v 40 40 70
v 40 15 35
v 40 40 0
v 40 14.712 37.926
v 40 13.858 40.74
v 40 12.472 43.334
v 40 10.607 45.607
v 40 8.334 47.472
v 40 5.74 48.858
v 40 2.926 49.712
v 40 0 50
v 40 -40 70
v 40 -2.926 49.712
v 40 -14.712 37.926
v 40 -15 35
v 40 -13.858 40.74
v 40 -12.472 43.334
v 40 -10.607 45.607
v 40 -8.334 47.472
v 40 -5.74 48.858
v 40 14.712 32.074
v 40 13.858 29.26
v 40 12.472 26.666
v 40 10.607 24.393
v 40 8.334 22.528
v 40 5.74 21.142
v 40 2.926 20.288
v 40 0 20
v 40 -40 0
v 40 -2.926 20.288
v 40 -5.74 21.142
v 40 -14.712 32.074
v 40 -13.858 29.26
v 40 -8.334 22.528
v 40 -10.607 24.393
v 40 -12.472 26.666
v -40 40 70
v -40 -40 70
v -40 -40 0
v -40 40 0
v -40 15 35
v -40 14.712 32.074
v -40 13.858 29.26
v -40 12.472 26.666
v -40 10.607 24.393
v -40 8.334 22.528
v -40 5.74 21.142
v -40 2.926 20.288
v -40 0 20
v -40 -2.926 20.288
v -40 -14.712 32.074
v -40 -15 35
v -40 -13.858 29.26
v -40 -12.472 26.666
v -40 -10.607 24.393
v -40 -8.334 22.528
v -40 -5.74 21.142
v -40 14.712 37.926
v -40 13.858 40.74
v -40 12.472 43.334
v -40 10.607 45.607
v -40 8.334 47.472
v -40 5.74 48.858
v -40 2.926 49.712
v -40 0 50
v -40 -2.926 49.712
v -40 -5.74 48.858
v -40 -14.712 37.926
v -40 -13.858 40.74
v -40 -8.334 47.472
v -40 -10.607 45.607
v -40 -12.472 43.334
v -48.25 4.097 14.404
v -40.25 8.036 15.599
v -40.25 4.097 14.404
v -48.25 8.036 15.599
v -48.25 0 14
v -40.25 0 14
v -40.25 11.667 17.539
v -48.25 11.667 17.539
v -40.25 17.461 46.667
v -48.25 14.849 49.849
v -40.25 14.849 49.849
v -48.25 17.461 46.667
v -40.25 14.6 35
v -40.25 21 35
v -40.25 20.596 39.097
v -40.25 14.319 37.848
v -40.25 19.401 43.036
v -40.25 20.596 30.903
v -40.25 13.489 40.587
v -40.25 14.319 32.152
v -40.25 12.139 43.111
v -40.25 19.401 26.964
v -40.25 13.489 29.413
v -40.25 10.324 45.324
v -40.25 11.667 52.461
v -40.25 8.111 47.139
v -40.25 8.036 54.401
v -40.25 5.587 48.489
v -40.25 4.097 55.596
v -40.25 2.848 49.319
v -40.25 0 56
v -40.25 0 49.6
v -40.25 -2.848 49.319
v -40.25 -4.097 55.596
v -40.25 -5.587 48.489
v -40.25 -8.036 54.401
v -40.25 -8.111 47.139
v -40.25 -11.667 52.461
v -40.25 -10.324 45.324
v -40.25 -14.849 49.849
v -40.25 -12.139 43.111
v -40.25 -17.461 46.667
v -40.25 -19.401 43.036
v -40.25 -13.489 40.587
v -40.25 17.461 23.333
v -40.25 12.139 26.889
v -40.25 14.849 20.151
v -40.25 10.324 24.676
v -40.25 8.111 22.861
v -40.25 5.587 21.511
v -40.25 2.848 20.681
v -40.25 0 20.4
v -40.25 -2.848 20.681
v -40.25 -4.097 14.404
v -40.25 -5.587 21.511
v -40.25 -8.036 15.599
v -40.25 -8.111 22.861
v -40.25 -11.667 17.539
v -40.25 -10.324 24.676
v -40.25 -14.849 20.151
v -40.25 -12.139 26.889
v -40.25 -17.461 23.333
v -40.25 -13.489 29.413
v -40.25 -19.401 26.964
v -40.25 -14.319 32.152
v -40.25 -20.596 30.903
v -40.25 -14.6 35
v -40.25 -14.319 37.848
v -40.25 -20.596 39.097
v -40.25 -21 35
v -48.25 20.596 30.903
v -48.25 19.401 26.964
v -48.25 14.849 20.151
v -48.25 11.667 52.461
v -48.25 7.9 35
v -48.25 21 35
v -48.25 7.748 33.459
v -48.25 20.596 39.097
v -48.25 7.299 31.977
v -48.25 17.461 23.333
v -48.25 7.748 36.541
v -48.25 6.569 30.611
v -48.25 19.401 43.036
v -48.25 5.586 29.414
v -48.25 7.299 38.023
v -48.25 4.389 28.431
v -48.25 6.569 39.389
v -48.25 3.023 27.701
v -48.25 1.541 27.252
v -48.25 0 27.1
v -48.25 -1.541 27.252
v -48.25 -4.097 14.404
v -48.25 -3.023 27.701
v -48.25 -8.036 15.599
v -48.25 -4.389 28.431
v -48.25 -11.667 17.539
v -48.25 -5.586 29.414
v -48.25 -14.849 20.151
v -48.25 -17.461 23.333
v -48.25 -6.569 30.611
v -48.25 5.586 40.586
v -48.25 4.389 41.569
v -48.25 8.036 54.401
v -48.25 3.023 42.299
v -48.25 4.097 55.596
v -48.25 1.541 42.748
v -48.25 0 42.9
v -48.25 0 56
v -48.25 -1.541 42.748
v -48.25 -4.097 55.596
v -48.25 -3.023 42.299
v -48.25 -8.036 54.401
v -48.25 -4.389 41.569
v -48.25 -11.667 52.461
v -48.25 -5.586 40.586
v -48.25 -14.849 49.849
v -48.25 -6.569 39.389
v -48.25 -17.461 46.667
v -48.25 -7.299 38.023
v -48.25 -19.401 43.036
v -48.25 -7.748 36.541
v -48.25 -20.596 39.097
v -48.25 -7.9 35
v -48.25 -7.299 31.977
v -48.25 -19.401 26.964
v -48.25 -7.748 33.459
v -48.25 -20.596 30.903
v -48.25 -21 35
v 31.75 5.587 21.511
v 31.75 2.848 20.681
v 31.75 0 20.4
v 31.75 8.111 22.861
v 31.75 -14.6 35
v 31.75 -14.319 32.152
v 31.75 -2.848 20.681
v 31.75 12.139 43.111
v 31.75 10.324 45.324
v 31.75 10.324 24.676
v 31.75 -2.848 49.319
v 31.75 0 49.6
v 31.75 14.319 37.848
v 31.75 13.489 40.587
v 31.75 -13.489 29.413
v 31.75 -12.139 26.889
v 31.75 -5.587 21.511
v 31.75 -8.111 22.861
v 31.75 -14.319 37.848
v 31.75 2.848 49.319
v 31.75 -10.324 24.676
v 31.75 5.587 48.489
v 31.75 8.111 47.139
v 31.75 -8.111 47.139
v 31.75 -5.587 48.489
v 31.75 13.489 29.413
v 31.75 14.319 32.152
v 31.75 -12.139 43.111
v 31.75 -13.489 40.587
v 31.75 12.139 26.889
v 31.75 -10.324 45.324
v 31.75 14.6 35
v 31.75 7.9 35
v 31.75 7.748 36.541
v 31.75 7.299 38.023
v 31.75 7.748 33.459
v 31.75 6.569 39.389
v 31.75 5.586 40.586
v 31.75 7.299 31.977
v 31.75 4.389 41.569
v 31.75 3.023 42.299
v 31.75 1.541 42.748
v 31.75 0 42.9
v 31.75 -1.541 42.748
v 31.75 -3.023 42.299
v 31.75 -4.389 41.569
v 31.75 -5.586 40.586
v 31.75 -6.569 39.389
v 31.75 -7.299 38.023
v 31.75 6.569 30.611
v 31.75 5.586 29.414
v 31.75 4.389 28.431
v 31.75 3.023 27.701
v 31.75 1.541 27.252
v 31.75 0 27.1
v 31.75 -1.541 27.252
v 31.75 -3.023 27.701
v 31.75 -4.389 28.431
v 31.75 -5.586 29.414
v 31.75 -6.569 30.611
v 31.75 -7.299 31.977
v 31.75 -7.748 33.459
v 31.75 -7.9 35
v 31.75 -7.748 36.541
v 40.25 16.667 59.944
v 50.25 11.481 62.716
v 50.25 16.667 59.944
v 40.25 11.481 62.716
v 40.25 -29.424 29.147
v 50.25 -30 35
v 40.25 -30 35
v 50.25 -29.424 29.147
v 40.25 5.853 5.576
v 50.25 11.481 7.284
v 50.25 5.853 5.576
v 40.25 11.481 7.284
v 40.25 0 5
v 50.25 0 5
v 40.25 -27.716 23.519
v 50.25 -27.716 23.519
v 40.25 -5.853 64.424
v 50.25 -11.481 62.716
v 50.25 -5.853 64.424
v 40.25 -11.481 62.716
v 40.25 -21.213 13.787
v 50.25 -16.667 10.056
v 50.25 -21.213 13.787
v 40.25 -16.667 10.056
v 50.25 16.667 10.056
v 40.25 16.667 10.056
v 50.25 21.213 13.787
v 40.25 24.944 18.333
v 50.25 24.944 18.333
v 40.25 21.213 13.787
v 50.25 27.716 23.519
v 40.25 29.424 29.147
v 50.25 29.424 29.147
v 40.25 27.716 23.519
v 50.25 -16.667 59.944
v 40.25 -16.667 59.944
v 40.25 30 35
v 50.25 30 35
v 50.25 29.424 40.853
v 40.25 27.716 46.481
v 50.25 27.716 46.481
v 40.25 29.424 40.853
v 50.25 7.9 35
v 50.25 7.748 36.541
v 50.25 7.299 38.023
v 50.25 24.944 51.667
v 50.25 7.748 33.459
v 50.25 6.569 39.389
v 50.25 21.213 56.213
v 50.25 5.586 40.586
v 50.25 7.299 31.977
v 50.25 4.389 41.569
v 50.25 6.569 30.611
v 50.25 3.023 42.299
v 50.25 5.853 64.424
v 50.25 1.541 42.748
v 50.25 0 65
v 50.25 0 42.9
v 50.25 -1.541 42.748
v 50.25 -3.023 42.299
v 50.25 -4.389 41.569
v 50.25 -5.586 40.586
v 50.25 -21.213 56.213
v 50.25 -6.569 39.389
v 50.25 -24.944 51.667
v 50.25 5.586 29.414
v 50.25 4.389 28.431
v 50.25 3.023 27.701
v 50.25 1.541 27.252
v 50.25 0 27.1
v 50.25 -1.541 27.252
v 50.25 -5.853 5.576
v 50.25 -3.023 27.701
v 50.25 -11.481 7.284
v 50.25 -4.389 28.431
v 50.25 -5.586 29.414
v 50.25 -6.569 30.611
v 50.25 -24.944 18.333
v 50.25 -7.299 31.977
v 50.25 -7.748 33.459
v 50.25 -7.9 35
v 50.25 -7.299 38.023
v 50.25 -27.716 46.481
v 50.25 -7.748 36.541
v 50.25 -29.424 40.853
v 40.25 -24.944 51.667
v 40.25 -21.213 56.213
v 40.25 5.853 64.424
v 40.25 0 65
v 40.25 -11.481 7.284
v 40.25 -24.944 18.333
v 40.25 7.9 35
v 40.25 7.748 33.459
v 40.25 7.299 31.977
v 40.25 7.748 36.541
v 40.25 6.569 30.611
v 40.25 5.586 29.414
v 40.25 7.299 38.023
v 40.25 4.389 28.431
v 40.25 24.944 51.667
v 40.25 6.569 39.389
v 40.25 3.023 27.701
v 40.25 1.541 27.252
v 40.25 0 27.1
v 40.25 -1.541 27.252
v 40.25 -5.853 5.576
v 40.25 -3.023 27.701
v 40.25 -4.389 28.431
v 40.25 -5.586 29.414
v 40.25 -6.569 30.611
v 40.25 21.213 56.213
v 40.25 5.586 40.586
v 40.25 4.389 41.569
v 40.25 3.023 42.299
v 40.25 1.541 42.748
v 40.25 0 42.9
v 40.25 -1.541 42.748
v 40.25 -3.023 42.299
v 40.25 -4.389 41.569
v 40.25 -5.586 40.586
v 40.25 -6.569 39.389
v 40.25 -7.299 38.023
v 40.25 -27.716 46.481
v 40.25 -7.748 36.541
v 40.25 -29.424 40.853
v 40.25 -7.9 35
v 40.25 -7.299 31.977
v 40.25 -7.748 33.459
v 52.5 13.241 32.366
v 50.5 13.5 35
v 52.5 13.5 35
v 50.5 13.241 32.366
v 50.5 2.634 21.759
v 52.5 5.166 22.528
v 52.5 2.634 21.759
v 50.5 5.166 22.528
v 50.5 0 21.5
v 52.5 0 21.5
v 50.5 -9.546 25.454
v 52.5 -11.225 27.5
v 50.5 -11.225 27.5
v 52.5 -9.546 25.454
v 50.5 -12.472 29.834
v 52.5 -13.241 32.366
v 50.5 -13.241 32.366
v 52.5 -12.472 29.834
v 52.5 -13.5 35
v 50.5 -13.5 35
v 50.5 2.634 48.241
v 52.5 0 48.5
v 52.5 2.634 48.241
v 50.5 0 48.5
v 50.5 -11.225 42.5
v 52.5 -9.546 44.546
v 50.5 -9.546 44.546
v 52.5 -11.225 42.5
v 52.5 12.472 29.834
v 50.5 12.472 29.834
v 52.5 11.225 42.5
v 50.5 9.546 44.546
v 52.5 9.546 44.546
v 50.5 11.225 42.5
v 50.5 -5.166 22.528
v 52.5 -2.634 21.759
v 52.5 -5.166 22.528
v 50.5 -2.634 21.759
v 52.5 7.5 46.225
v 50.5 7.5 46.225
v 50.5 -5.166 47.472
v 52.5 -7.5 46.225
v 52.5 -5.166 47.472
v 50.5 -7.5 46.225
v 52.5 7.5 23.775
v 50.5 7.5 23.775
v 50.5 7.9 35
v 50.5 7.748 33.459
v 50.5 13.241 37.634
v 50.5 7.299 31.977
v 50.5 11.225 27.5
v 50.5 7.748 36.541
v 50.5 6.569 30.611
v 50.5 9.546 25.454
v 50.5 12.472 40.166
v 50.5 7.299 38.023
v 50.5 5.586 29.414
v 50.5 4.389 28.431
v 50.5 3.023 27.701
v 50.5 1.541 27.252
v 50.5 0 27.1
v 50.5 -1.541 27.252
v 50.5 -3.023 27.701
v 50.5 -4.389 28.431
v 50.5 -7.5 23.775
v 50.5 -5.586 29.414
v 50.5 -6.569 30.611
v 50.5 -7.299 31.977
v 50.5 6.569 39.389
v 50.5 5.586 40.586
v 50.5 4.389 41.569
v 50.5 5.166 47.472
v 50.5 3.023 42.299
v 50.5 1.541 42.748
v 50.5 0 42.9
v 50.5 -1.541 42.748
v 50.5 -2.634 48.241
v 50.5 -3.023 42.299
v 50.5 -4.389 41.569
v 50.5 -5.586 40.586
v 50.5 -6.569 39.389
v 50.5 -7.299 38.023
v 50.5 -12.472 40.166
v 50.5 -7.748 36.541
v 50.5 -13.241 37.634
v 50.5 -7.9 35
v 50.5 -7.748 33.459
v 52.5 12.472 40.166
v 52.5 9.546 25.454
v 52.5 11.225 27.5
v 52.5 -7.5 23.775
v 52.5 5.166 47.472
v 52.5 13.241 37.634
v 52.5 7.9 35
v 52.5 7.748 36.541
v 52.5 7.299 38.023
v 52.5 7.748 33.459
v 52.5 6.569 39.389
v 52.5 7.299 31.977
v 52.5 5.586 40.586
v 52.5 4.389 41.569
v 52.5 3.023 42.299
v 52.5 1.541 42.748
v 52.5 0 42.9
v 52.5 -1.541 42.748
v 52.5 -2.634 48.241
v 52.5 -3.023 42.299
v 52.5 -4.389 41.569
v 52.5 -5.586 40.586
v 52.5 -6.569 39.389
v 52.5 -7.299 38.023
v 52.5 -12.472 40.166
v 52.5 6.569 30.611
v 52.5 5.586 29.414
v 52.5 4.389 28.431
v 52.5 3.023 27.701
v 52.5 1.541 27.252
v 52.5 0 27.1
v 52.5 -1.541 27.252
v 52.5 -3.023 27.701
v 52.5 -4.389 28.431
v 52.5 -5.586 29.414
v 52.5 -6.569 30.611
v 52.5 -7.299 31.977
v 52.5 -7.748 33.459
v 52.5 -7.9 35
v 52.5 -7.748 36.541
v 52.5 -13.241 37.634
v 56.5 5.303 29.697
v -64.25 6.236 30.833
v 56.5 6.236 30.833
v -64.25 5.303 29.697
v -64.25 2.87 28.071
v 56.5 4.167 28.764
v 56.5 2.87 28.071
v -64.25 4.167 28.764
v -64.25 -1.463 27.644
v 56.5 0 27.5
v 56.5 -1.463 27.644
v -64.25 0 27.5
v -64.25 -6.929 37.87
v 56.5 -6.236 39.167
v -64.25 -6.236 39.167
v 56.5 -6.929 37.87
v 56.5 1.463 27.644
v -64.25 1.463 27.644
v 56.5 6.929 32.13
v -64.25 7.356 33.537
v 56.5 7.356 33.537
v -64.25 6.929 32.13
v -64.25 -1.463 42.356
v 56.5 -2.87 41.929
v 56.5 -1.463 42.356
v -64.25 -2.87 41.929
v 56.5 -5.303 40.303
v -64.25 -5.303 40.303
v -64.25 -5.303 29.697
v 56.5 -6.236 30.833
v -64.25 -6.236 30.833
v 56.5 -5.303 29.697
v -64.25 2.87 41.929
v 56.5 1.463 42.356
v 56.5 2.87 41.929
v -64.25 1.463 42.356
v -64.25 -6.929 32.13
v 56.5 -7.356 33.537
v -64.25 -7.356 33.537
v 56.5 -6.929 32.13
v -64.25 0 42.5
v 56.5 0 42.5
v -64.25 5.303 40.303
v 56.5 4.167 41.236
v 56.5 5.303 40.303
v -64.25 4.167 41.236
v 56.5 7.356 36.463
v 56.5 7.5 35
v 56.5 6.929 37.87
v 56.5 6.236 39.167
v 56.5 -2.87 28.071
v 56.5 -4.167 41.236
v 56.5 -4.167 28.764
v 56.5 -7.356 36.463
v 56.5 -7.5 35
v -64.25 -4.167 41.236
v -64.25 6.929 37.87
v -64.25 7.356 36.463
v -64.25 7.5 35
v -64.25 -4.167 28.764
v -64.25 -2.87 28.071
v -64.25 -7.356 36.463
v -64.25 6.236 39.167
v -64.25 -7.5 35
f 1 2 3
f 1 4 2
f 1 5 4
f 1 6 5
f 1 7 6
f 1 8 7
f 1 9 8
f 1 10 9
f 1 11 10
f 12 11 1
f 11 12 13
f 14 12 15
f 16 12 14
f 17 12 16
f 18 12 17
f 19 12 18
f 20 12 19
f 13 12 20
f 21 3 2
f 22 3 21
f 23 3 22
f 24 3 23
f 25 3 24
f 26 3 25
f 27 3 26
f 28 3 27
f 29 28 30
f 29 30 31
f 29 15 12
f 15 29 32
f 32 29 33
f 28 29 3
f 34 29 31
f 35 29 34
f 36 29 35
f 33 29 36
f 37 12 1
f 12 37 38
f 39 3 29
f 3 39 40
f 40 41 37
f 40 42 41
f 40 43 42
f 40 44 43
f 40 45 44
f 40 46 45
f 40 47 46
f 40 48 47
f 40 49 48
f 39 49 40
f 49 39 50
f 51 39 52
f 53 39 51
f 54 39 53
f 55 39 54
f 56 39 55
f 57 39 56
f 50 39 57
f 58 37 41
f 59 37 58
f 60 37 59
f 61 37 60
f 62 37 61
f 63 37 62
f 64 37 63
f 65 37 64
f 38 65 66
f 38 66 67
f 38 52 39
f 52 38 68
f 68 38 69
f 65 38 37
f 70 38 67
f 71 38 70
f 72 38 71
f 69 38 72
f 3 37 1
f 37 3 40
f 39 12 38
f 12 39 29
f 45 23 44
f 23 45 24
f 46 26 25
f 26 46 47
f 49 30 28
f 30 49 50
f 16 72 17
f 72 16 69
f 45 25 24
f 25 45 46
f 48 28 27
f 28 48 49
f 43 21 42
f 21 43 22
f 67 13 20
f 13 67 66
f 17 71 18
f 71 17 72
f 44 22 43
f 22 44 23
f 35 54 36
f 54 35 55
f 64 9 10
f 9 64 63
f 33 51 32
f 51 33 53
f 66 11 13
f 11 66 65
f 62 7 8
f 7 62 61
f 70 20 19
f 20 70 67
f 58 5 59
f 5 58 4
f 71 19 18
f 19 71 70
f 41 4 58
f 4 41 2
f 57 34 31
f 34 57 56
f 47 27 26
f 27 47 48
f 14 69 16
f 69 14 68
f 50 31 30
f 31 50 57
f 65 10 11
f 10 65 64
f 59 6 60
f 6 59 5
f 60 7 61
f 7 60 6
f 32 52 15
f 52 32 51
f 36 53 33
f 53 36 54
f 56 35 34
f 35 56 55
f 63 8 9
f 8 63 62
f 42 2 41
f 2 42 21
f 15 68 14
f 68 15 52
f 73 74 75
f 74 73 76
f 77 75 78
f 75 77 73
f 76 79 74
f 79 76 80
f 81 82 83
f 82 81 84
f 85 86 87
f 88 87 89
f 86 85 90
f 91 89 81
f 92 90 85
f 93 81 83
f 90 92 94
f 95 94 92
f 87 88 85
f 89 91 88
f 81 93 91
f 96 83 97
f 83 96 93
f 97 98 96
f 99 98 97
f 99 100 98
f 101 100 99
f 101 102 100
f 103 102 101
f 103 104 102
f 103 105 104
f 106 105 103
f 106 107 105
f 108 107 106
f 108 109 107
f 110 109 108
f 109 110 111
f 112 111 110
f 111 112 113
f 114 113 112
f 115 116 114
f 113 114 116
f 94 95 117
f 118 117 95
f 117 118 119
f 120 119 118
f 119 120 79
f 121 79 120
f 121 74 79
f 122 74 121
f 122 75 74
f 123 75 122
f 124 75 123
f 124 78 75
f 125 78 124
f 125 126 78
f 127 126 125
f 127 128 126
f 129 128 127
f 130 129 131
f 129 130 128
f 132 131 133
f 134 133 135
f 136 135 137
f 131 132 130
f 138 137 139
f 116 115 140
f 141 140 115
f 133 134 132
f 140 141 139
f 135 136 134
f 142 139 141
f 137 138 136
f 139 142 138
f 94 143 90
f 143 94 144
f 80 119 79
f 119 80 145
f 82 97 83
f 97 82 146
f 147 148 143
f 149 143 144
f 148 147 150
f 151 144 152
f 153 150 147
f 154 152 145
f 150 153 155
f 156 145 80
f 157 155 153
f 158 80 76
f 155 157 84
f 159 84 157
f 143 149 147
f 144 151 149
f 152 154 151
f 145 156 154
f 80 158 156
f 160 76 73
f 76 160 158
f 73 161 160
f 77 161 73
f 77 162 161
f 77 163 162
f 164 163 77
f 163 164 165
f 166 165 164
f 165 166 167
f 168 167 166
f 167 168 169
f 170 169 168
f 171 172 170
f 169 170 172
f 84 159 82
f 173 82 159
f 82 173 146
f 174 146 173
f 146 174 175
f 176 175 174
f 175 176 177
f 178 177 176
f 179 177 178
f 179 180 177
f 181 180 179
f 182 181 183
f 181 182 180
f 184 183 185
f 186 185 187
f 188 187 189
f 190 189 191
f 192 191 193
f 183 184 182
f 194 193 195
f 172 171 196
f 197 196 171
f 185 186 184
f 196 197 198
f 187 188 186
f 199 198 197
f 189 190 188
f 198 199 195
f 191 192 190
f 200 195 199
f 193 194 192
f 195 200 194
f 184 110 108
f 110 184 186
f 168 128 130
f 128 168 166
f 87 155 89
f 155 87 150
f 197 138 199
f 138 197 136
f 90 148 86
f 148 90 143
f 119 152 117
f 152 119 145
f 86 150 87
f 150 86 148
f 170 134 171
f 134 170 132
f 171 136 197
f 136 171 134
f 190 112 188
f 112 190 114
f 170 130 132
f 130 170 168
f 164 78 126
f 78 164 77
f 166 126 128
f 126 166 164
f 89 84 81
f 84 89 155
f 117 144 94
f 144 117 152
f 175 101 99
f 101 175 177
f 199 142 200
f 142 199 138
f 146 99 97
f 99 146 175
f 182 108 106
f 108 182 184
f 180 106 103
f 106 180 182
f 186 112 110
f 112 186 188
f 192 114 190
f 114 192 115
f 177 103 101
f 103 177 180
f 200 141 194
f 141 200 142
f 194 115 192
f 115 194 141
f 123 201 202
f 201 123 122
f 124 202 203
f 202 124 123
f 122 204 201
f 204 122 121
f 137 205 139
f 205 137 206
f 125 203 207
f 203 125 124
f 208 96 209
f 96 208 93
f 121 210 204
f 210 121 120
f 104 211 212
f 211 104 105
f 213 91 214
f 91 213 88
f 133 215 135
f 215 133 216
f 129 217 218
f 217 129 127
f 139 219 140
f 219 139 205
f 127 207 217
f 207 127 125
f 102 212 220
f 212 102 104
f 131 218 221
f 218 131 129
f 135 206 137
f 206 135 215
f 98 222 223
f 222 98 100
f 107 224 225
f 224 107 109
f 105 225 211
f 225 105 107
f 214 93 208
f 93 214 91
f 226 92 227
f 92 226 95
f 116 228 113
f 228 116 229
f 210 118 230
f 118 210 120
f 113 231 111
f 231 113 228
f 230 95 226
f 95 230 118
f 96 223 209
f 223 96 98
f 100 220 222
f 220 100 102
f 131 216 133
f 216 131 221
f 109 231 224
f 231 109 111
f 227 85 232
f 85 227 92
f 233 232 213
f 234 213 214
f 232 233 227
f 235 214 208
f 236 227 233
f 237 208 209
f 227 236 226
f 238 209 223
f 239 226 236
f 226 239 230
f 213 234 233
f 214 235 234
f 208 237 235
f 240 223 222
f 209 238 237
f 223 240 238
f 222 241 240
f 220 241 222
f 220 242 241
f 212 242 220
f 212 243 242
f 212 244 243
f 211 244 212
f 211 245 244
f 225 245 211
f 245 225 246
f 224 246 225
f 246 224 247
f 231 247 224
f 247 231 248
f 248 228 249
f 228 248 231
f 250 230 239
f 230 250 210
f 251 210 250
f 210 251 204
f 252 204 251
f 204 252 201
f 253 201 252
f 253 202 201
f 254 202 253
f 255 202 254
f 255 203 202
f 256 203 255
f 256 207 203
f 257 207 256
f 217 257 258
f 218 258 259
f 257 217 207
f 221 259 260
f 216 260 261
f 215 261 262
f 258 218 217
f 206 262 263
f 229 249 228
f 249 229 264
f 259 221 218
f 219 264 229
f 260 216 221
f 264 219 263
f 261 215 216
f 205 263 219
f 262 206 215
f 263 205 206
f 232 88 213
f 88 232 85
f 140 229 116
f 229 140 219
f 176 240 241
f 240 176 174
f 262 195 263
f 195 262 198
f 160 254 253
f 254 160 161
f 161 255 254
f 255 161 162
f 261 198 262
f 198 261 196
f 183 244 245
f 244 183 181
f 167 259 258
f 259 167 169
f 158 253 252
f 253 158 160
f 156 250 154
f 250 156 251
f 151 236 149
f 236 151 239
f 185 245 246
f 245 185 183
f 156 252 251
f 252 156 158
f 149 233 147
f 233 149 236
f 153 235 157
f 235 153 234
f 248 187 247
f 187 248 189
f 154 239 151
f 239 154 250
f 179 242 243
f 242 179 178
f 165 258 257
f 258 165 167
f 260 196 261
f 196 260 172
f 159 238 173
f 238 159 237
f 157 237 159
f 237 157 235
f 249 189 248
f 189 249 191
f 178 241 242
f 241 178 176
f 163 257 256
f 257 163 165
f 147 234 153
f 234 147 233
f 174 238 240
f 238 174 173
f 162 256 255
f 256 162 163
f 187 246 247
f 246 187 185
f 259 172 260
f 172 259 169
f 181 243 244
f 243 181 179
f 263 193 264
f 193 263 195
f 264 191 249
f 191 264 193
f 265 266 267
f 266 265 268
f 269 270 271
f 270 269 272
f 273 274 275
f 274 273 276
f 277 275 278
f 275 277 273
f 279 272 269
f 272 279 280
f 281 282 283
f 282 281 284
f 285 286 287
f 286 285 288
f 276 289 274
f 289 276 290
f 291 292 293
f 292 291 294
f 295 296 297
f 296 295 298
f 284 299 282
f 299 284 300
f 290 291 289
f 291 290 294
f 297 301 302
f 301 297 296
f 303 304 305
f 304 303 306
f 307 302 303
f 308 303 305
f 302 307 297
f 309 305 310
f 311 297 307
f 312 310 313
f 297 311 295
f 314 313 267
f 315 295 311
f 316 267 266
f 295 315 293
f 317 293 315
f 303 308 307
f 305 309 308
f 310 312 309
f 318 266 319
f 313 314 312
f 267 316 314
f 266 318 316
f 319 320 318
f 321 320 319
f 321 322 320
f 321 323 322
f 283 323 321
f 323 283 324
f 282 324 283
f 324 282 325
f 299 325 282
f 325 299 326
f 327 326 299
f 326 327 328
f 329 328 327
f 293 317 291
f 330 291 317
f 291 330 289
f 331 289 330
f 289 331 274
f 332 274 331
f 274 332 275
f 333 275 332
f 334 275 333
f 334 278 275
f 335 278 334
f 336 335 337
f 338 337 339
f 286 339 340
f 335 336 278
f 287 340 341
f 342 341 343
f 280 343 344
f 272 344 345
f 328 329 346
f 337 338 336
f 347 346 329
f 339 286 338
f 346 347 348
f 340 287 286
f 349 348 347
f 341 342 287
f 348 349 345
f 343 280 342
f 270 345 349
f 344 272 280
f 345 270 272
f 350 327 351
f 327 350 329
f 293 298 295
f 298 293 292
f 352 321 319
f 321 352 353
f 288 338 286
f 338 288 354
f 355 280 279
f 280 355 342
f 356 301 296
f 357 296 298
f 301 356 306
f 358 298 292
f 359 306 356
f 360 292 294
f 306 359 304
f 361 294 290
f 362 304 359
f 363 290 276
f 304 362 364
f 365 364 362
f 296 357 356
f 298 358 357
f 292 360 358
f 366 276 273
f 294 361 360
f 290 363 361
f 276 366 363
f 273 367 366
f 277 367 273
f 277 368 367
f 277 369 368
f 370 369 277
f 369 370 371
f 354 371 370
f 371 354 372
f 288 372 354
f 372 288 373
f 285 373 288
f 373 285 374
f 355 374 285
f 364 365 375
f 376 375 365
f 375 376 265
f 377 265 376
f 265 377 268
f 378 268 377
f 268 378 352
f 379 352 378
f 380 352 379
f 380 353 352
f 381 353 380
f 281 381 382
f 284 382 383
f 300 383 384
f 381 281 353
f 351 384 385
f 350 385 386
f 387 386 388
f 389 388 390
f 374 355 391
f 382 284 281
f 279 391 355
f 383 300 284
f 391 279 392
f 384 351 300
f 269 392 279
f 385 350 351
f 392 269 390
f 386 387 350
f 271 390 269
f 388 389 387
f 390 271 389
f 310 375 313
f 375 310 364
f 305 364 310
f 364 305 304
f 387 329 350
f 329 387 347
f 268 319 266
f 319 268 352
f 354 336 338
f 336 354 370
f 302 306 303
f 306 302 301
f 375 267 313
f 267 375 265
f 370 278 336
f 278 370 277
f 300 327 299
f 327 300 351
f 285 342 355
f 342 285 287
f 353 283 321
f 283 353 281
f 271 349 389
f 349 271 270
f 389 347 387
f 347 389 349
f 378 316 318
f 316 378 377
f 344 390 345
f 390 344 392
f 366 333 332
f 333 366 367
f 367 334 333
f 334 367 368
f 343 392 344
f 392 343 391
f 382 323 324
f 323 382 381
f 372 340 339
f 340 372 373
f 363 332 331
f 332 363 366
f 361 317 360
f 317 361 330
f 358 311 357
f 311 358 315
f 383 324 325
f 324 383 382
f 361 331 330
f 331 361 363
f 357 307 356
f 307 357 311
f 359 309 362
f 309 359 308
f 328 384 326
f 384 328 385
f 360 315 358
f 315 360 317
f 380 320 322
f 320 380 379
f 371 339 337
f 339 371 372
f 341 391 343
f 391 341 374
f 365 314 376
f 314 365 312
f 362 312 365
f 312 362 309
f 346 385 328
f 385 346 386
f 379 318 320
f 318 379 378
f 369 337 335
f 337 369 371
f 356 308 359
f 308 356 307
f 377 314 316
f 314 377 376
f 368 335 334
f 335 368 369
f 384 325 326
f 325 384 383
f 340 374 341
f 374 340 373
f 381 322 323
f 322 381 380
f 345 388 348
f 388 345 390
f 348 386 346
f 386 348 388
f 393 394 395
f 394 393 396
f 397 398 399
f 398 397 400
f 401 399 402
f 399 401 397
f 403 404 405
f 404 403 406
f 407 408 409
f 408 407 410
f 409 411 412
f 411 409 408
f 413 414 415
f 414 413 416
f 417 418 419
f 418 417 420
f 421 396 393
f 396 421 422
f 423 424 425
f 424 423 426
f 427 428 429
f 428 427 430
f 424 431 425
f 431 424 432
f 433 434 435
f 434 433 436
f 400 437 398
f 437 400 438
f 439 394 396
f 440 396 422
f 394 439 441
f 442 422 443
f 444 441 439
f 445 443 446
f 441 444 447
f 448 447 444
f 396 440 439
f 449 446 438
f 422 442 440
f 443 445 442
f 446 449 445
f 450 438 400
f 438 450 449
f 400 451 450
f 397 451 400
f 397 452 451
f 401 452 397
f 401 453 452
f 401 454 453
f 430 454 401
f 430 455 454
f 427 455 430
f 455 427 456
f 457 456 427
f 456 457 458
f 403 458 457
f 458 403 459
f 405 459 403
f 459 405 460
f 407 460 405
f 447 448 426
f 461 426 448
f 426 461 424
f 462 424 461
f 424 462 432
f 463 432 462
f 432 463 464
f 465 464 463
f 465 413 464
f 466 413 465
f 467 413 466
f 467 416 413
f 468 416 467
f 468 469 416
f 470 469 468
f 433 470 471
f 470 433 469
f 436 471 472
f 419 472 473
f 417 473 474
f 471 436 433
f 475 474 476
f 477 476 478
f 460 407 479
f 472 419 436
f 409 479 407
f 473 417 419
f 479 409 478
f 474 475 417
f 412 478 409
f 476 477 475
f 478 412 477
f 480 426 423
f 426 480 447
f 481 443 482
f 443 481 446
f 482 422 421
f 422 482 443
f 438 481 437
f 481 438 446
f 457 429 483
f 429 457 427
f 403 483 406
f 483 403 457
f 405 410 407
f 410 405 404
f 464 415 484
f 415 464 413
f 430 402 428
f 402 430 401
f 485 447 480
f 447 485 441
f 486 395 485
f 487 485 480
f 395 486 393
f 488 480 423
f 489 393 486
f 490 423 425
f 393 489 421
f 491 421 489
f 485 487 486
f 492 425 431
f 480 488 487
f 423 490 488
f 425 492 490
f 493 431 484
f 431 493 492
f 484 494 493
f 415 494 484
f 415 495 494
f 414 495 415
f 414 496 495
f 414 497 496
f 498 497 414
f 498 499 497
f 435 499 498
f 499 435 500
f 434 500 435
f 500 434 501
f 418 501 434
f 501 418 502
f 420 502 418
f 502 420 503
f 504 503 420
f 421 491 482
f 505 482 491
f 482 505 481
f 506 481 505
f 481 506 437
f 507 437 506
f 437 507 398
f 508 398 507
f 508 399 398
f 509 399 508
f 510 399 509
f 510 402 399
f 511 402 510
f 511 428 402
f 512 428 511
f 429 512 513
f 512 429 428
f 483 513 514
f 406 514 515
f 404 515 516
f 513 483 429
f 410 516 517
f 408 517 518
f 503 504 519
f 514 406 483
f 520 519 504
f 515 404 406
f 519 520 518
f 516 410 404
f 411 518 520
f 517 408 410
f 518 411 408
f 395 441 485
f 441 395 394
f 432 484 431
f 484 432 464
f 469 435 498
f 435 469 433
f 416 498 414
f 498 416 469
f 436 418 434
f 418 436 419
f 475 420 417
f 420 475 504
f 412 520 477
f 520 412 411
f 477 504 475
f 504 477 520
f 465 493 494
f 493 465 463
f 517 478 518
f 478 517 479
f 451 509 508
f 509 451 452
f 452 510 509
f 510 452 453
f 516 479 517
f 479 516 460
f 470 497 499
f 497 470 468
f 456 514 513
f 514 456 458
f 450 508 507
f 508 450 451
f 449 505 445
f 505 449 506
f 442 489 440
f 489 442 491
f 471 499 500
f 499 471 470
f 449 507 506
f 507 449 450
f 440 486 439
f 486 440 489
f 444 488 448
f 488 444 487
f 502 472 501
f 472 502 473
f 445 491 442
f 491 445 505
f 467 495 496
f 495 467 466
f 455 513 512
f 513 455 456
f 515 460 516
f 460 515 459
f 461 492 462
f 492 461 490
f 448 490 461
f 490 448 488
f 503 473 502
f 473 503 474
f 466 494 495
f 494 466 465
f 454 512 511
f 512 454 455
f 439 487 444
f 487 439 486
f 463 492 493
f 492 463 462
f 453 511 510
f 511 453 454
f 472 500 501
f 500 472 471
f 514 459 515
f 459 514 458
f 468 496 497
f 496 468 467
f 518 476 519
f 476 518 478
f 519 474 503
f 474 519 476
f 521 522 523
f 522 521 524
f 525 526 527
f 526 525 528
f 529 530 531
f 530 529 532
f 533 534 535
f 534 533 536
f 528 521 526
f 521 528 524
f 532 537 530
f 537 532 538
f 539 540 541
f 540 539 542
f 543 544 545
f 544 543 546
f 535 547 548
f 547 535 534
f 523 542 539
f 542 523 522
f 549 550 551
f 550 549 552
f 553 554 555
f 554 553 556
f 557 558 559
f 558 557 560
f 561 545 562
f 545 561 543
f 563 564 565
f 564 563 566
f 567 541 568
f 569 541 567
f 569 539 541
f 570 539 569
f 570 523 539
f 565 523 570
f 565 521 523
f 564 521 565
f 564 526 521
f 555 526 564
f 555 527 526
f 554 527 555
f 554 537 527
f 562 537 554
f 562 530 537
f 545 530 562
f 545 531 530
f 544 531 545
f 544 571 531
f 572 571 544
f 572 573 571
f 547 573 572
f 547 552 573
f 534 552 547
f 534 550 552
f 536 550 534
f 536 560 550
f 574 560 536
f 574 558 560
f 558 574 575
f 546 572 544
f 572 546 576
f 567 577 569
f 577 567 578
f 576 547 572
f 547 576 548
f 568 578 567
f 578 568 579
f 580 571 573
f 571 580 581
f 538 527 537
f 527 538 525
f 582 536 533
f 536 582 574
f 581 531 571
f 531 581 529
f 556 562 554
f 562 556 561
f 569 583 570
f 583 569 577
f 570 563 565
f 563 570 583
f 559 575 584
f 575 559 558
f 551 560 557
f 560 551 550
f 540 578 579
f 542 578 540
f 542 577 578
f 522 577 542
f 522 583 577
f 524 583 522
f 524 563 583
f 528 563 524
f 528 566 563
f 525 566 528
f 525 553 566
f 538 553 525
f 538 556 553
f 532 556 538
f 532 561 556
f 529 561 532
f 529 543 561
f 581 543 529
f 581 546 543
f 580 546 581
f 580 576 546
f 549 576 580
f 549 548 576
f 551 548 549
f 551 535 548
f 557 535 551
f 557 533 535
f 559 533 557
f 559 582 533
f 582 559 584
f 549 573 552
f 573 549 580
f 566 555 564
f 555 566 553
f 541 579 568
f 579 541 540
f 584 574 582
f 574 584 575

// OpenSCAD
$fn = 32;

// ------------------------------------------------------------------------
// Bushed housing: 80 x 80 x 70 mm housing, bushing d29.2
// Every part is its own module, assembly() places them once.
// ------------------------------------------------------------------------

// --- part 1 ---
module housing() {
  difference() {
    translate([-40, -40, 0]) cube([80, 80, 70]);
    translate([0, 0, 35]) rotate([0, 90, 0]) cylinder(h = 82, d = 30, center = true);
  }
}

// --- part 2 ---
module bushing() {
  difference() {
    union() {
      cylinder(h = 8, d = 42);
      translate([0, 0, 8]) cylinder(h = 72, d = 29.2);
    }
    translate([0, 0, -1]) cylinder(h = 82, d = 15.8);
  }
}

// --- part 3 ---
module shaft() {
  translate([0, 0, -60.375]) cylinder(h = 120.75, d = 15);
}

// --- part 4 ---
module cover() {
  difference() {
    cylinder(h = 10, d = 60);
    translate([0, 0, -1]) cylinder(h = 12, d = 15.8);
  }
}

// --- part 5 ---
module washer() {
  difference() {
      translate([0, 0, 0]) cylinder(h = 2, d = 27);
      translate([0, 0, -1]) cylinder(h = 4, d = 15.8);
    }
}

// --- assembly ---
module assembly() {
  translate([0, 0, 0]) rotate([0, 0, 0]) housing();
  translate([-48.25, 0, 35]) rotate([0, 90, 0]) bushing();
  translate([-3.875, 0, 35]) rotate([0, 90, 0]) shaft();
  translate([40.25, 0, 35]) rotate([0, 90, 0]) cover();
  translate([50.5, 0, 35]) rotate([0, 90, 0]) washer();
}

assembly();
